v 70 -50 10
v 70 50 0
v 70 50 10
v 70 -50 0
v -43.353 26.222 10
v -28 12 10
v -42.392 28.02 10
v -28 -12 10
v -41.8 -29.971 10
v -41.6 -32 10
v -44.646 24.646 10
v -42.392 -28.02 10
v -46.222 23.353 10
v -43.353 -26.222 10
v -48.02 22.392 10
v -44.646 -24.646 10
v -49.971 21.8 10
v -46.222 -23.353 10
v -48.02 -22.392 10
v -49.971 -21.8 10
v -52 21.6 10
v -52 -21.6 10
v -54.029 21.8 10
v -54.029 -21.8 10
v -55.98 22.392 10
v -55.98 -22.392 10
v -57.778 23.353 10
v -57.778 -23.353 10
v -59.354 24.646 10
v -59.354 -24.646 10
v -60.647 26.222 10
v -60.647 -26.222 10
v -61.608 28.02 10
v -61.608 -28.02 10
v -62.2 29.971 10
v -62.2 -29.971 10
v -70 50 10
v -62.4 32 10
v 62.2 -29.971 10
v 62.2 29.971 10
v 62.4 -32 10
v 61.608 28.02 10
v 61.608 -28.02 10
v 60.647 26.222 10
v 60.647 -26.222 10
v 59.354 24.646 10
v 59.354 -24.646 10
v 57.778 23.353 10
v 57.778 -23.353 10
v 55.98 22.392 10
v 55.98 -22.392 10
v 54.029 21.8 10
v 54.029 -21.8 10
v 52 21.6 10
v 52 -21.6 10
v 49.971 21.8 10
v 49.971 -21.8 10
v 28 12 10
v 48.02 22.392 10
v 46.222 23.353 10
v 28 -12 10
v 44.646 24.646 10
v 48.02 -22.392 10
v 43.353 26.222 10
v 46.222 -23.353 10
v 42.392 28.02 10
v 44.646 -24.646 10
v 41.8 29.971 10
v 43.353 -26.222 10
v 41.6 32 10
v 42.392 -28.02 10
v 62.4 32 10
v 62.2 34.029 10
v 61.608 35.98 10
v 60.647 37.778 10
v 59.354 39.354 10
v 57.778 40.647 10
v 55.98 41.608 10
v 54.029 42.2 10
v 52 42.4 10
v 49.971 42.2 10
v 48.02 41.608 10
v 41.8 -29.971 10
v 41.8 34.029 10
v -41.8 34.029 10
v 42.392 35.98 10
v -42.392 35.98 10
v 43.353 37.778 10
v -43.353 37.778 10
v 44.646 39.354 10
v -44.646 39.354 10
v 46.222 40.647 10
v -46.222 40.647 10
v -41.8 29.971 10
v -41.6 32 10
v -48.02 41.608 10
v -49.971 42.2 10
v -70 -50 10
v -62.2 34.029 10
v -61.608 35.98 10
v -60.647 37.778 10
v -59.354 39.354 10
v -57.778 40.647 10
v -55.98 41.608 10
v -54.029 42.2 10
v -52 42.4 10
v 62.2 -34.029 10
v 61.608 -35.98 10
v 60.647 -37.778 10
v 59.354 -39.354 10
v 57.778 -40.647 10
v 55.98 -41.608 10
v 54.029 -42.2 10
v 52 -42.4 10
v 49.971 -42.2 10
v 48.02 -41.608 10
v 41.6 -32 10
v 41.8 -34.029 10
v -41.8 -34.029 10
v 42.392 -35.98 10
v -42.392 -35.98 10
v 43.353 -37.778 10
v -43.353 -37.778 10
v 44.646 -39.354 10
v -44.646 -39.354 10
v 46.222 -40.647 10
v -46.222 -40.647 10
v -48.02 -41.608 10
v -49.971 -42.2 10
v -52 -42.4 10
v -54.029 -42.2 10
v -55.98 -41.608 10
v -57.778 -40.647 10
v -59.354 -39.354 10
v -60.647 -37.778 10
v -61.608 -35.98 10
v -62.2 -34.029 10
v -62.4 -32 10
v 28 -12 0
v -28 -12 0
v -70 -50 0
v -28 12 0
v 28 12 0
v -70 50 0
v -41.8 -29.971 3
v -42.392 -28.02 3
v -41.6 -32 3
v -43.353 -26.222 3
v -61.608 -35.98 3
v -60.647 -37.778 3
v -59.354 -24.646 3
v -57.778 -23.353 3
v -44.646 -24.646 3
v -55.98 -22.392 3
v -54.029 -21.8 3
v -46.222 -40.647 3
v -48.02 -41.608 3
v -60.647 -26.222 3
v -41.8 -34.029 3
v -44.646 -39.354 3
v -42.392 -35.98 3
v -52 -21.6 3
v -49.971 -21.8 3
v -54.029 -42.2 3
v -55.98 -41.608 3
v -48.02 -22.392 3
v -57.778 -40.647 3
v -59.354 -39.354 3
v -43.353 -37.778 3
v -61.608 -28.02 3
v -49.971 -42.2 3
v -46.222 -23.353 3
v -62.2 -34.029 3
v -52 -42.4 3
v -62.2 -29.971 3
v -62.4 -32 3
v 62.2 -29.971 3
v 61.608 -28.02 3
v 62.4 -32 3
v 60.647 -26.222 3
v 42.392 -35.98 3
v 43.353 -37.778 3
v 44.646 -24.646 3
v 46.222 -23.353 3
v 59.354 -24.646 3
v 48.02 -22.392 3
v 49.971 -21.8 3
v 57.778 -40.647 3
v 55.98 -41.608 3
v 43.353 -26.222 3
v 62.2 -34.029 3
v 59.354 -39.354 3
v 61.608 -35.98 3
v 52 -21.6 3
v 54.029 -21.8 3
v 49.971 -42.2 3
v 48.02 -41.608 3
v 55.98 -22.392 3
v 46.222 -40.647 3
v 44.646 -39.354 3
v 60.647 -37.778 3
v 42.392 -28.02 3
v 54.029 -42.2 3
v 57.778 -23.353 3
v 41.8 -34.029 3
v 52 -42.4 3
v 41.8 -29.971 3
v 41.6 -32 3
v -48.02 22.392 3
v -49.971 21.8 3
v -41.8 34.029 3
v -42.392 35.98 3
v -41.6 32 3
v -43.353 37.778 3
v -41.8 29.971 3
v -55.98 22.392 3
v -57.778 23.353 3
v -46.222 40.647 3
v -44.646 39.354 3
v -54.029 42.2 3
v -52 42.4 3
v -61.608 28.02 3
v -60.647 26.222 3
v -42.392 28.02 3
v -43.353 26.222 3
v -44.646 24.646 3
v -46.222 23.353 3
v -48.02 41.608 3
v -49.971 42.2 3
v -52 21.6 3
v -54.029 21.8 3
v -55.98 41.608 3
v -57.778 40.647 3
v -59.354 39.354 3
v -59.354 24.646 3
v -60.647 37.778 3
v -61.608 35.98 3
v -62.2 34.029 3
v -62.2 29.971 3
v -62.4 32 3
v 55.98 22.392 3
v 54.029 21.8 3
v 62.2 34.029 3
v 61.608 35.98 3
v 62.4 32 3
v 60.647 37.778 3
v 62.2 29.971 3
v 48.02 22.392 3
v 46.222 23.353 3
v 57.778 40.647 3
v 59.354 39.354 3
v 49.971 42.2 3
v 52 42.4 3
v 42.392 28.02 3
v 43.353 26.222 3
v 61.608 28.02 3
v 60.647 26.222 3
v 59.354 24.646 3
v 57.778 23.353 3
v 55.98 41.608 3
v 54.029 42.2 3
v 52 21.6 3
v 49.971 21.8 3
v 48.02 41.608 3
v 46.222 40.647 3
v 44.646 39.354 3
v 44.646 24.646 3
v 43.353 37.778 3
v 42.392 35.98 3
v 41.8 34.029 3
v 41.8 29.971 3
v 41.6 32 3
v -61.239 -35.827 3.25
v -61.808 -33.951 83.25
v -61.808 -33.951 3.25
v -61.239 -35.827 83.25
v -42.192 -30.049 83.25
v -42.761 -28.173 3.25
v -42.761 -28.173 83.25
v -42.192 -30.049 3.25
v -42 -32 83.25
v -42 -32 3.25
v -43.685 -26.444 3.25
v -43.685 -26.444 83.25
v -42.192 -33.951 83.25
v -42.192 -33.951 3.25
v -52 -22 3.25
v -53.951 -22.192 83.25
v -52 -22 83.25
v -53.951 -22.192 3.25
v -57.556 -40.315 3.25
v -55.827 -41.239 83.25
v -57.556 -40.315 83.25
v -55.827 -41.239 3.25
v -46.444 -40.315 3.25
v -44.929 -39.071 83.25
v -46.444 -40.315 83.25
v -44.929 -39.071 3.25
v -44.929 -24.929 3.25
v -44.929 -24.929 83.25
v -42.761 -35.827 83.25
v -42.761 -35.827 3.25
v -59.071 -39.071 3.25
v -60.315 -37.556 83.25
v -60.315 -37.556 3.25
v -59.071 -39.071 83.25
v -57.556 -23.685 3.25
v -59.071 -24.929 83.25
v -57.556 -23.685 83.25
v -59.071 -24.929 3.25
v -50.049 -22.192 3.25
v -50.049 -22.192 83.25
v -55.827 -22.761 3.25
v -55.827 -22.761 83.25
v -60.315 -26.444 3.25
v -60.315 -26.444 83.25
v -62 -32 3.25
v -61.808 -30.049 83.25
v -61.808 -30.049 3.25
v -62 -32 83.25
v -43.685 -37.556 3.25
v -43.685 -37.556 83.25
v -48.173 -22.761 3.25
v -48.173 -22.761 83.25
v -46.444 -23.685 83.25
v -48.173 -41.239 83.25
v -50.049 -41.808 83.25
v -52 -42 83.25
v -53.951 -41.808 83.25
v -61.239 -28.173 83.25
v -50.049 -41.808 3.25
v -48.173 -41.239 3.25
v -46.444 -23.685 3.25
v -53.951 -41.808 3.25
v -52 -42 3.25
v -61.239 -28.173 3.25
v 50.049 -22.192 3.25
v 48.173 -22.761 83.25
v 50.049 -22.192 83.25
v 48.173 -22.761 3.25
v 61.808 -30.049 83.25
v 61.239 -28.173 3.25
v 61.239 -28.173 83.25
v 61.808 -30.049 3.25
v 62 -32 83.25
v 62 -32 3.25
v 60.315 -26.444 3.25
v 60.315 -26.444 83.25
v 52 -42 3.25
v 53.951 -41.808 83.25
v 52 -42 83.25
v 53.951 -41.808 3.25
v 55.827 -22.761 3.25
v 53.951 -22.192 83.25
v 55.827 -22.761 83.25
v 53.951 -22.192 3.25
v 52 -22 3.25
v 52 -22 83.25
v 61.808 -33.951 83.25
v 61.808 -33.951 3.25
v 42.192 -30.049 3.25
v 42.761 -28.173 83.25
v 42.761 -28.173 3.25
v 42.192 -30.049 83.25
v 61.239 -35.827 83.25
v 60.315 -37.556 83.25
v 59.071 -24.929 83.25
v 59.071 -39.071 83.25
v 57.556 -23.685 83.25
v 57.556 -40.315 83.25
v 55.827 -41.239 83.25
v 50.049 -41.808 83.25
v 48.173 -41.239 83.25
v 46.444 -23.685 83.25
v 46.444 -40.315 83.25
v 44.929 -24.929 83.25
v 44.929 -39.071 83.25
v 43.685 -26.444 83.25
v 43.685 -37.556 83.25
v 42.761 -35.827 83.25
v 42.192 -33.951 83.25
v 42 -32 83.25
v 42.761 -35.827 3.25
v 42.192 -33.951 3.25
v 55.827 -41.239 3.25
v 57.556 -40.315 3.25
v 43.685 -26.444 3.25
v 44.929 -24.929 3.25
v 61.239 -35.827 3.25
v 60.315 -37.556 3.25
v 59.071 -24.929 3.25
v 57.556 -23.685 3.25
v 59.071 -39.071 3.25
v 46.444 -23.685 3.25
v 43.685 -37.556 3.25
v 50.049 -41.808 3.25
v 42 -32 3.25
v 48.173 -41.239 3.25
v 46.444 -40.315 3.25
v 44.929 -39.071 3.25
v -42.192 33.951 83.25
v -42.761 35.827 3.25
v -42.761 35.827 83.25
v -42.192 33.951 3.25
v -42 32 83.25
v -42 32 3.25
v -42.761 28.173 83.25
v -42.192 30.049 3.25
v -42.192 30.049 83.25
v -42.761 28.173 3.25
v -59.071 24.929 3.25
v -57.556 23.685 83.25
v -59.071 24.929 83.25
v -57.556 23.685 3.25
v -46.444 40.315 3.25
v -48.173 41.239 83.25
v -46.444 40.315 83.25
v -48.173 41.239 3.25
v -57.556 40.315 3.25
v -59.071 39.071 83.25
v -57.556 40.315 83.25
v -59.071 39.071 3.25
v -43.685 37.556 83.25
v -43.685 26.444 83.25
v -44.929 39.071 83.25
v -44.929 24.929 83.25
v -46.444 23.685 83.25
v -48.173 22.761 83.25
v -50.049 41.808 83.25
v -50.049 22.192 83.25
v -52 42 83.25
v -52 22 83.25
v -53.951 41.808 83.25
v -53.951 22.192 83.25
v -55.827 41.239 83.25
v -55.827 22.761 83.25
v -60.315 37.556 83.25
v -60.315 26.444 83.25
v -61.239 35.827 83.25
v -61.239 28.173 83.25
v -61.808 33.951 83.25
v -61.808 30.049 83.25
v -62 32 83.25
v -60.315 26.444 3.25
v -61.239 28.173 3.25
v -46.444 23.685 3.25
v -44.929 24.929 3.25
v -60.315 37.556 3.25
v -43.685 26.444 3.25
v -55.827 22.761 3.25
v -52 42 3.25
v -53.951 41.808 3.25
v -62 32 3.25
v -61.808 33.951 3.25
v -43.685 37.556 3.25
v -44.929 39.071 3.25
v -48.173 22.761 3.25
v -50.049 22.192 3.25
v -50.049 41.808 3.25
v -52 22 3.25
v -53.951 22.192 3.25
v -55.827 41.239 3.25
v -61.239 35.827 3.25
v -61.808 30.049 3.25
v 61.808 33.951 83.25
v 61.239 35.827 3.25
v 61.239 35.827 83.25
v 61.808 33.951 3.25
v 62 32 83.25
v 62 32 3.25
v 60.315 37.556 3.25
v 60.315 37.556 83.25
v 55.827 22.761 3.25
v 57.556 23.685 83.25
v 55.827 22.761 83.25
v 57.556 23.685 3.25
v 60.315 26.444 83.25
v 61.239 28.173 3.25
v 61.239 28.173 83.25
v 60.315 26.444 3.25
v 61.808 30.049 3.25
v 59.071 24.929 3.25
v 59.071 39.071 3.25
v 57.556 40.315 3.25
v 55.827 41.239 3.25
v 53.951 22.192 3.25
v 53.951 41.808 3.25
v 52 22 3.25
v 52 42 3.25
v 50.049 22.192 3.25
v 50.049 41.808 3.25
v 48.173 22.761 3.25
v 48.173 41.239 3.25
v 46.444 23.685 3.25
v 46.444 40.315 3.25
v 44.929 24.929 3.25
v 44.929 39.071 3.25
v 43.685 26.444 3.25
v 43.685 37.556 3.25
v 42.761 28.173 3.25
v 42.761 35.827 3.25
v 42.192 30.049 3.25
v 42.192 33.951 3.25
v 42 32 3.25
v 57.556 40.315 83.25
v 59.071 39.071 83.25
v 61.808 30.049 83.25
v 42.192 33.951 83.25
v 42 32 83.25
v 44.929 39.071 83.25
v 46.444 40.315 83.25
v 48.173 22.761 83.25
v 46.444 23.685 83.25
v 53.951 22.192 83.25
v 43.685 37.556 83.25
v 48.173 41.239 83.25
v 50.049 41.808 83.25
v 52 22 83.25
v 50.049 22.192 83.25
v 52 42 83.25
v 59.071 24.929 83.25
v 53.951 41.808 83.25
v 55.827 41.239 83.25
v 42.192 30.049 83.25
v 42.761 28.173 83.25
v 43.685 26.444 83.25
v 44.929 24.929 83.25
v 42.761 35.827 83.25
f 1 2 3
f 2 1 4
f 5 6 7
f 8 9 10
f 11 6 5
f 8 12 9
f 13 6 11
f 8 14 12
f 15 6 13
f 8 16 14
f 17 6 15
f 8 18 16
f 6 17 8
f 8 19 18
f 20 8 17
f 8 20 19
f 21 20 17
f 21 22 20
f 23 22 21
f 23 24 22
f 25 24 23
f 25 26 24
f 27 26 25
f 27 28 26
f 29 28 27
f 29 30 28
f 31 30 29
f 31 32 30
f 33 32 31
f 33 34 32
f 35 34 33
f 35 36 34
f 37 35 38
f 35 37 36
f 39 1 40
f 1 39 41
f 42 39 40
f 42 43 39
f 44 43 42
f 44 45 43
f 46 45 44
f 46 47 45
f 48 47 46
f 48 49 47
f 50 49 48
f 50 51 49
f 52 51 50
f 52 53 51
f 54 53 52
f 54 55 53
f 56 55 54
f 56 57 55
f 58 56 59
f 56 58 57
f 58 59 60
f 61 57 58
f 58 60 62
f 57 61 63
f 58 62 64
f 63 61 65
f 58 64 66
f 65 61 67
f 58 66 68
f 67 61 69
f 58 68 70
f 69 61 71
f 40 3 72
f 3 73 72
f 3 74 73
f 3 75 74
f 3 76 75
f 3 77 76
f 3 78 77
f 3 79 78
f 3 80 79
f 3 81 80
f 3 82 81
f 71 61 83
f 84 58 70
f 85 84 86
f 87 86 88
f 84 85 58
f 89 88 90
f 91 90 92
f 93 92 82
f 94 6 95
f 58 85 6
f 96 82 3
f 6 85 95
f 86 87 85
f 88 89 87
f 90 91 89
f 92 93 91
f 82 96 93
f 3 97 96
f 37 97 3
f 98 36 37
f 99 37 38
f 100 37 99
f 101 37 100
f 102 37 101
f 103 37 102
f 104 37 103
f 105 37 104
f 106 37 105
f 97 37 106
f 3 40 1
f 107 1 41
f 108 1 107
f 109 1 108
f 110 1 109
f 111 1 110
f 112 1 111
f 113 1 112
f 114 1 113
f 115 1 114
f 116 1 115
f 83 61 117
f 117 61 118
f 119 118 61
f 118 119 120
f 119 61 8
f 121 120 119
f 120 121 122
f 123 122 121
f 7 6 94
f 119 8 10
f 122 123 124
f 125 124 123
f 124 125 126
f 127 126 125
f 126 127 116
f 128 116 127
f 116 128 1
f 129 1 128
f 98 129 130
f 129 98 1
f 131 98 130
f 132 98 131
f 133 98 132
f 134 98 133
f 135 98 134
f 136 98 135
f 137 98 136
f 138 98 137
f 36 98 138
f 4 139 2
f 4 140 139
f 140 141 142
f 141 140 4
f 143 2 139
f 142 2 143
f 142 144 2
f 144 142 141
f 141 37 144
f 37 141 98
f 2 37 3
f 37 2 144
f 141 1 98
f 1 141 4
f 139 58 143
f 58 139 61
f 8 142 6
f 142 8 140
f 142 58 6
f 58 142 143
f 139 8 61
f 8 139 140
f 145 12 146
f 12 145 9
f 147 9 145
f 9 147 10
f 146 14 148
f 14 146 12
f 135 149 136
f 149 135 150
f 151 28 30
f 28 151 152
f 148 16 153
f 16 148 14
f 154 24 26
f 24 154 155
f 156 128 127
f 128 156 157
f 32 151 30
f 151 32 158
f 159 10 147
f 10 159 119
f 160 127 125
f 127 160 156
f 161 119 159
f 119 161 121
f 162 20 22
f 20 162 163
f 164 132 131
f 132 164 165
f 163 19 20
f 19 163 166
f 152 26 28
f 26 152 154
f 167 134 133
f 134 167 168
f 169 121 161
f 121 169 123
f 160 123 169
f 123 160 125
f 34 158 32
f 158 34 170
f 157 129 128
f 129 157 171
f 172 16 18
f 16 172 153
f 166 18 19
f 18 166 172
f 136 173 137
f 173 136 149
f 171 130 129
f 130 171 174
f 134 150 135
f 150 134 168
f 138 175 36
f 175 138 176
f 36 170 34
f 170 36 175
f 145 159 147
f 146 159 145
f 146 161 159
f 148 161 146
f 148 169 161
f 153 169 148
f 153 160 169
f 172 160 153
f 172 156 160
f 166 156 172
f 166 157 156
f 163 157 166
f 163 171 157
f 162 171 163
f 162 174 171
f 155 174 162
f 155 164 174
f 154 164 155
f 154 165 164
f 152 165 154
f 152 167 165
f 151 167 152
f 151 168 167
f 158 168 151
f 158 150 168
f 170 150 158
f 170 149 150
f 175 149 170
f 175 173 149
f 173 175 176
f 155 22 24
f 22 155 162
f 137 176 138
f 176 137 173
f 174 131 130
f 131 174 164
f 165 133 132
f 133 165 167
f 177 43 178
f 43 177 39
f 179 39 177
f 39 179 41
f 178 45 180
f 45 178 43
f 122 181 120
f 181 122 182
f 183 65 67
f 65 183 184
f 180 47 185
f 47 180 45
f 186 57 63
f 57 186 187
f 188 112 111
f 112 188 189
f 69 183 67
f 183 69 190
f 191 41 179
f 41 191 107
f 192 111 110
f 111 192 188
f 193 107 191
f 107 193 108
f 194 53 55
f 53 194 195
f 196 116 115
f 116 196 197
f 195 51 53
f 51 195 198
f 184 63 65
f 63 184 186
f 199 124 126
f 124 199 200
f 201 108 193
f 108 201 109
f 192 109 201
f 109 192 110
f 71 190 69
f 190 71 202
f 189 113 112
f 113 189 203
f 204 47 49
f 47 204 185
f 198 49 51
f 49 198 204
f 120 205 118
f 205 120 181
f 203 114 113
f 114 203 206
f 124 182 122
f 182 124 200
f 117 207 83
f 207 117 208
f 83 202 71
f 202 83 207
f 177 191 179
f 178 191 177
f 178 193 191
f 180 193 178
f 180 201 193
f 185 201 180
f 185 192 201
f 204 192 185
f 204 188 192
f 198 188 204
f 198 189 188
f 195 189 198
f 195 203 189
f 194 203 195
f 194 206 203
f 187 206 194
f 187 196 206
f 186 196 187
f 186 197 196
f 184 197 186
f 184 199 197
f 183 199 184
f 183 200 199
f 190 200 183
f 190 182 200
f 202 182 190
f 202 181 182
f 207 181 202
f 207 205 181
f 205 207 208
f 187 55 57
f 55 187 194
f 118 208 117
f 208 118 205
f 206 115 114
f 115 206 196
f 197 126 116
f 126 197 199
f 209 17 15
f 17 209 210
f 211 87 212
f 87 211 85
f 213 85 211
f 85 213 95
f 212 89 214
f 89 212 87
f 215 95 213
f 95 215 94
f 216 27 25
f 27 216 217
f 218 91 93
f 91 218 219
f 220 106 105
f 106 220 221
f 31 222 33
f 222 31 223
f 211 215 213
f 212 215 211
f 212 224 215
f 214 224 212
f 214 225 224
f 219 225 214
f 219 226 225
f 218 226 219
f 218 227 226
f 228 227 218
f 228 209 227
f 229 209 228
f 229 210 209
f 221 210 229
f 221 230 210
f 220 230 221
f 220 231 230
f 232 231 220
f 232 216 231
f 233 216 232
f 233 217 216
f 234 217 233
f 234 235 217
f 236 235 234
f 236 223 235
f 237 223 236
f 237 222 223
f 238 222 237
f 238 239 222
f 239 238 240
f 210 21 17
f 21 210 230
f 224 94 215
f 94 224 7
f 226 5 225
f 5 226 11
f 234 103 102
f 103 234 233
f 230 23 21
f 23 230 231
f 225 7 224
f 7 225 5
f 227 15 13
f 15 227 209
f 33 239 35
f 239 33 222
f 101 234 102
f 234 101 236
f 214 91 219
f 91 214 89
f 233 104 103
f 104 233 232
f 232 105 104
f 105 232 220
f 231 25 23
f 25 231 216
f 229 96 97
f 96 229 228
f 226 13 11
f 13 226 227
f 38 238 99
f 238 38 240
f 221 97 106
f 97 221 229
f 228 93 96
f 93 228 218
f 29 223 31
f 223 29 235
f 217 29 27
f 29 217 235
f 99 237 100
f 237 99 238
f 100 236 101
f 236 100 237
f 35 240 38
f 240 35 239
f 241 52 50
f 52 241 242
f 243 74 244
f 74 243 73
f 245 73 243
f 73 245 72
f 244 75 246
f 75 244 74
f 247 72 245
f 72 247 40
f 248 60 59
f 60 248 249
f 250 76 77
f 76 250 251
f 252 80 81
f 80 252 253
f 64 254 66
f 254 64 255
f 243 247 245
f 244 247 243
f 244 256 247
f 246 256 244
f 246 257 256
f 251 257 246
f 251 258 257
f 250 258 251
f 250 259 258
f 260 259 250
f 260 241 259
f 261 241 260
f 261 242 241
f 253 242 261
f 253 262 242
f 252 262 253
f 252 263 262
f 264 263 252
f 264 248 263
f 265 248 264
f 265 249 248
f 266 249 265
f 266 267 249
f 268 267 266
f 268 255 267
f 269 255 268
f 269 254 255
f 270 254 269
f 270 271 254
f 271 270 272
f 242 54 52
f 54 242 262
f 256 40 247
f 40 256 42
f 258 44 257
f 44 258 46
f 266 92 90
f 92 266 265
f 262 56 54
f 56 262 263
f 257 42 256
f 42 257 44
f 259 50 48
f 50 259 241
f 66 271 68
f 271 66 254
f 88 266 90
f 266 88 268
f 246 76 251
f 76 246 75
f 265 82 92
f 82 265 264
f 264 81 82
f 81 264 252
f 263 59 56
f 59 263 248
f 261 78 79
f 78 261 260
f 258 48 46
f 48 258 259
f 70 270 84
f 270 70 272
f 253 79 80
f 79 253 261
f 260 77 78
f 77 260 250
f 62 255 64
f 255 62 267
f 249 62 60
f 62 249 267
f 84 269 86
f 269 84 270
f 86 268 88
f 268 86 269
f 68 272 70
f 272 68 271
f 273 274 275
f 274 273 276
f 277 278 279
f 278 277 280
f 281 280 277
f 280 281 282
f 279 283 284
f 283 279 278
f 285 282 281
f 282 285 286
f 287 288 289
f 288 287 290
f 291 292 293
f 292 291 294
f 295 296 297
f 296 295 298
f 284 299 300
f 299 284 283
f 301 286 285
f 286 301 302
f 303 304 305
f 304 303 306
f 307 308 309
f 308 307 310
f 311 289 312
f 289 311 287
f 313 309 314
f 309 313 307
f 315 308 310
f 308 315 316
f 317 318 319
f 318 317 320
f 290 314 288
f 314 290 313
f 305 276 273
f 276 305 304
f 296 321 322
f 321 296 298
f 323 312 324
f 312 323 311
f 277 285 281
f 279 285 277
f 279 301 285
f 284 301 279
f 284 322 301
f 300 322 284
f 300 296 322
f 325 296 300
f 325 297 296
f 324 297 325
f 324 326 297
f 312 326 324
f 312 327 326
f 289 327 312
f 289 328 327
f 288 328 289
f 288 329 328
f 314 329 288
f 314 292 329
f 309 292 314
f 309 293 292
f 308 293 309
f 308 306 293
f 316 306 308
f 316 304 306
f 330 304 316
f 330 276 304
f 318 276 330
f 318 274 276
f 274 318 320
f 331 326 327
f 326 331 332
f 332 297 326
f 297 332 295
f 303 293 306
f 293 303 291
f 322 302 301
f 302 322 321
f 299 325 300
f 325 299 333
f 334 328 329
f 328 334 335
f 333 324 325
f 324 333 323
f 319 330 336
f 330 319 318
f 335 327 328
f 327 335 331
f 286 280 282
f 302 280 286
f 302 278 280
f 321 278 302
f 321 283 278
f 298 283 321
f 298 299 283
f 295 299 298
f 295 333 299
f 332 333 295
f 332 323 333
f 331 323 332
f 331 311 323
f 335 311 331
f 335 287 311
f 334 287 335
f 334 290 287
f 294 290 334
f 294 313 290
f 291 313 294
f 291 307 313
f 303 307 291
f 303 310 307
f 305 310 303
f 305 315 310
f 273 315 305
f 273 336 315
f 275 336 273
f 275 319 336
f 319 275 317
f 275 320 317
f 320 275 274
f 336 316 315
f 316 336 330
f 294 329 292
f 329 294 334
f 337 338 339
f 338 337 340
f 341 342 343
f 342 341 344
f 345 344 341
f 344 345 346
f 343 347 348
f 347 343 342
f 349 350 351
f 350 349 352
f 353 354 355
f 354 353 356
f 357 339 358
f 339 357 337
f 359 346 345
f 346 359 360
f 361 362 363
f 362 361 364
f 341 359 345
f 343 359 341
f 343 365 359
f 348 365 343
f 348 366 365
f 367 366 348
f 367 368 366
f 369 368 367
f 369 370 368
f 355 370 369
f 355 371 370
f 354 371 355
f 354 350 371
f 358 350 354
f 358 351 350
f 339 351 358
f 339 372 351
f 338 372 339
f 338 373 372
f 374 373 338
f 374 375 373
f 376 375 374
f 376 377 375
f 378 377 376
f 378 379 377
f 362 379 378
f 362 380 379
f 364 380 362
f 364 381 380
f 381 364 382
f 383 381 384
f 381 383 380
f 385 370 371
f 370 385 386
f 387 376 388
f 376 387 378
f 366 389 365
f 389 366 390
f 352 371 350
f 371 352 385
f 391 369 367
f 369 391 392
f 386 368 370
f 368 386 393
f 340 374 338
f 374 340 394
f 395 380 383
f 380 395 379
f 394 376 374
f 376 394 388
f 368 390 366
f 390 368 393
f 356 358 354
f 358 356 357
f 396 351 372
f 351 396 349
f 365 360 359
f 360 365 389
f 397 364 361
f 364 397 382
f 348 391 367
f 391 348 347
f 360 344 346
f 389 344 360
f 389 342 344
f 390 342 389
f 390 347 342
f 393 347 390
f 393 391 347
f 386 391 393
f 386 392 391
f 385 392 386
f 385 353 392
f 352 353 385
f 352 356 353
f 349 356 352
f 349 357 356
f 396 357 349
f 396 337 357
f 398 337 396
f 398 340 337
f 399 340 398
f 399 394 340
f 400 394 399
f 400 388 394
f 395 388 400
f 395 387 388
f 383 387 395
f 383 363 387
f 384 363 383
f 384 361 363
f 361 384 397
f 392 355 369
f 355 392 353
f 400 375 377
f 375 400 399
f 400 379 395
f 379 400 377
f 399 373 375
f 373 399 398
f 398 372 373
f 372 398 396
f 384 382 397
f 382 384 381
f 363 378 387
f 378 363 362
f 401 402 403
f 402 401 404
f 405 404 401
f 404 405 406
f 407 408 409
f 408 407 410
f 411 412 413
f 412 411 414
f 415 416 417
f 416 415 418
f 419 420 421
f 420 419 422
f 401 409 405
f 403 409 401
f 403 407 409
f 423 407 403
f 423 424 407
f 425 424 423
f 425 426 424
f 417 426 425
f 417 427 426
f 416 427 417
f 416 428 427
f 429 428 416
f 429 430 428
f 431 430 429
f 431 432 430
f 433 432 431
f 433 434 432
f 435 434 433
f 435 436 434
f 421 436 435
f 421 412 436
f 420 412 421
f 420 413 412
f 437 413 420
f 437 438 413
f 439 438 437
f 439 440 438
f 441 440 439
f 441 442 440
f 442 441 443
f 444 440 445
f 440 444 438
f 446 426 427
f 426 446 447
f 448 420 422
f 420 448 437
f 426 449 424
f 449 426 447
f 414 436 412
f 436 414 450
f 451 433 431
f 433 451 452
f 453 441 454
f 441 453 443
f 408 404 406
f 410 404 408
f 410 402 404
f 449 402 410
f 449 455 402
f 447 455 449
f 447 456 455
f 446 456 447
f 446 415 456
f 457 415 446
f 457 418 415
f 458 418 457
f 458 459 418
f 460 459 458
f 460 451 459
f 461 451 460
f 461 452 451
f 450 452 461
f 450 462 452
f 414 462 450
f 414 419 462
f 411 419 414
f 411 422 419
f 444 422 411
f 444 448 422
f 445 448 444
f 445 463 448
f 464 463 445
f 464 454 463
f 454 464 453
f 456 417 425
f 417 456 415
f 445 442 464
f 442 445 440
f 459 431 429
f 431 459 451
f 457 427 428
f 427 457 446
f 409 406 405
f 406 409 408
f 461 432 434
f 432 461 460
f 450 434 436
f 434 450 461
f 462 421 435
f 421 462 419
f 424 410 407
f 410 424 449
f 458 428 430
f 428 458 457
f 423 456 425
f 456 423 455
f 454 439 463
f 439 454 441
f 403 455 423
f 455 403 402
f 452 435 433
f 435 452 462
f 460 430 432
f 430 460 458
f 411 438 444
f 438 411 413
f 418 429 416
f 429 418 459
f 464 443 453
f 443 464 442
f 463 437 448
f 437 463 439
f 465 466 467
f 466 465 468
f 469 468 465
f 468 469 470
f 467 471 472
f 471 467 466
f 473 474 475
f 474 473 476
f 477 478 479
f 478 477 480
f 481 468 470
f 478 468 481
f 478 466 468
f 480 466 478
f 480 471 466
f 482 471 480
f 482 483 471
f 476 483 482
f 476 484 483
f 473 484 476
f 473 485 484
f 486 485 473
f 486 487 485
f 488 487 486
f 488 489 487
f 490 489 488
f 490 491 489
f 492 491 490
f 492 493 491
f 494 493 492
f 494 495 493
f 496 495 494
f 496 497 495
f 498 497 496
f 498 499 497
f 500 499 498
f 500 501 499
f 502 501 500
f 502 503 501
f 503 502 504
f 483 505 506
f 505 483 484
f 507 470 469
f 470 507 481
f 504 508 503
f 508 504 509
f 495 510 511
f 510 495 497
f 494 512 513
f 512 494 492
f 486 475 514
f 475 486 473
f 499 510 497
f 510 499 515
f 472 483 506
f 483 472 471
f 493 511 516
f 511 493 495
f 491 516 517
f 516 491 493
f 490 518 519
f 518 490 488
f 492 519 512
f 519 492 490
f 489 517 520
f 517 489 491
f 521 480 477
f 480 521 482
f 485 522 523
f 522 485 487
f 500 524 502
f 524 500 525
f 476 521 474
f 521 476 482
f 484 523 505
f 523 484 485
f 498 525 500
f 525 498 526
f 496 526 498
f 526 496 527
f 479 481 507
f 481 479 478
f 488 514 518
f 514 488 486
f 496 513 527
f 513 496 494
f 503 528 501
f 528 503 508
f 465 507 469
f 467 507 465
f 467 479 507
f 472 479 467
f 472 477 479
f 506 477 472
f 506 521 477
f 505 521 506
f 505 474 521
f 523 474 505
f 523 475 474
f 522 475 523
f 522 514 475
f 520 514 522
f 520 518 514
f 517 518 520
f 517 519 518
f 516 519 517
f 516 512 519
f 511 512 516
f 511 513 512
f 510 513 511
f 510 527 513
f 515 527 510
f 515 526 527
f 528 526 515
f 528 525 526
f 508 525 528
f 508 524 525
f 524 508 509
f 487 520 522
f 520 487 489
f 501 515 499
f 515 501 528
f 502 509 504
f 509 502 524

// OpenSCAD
$fn = 32;

// ------------------------------------------------------------------------
// Frame with four posts: 140 x 100 mm frame, four d20 posts
// Every part is its own module, assembly() places them once.
// ------------------------------------------------------------------------

// --- part 1 ---
module base_frame() {
  difference() {
    translate([-70, -50, 0]) cube([140, 100, 10]);
    translate([-28, -12, -1]) cube([56, 24, 12]);
    translate([-52, -32, 3]) cylinder(h = 8, d = 20.8);
    translate([52, -32, 3]) cylinder(h = 8, d = 20.8);
    translate([-52, 32, 3]) cylinder(h = 8, d = 20.8);
    translate([52, 32, 3]) cylinder(h = 8, d = 20.8);
  }
}

// --- part 2 ---
module post1() {
  cylinder(h = 80, d = 20);
}

// --- part 3 ---
module post2() {
  cylinder(h = 80, d = 20);
}

// --- part 4 ---
module post3() {
  cylinder(h = 80, d = 20);
}

// --- part 5 ---
module post4() {
  cylinder(h = 80, d = 20);
}

// --- assembly ---
module assembly() {
  translate([0, 0, 0]) rotate([0, 0, 0]) base_frame();
  translate([-52, -32, 3.25]) rotate([0, 0, 0]) post1();
  translate([52, -32, 3.25]) rotate([0, 0, 0]) post2();
  translate([-52, 32, 3.25]) rotate([0, 0, 0]) post3();
  translate([52, 32, 3.25]) rotate([0, 0, 0]) post4();
}

assembly();
